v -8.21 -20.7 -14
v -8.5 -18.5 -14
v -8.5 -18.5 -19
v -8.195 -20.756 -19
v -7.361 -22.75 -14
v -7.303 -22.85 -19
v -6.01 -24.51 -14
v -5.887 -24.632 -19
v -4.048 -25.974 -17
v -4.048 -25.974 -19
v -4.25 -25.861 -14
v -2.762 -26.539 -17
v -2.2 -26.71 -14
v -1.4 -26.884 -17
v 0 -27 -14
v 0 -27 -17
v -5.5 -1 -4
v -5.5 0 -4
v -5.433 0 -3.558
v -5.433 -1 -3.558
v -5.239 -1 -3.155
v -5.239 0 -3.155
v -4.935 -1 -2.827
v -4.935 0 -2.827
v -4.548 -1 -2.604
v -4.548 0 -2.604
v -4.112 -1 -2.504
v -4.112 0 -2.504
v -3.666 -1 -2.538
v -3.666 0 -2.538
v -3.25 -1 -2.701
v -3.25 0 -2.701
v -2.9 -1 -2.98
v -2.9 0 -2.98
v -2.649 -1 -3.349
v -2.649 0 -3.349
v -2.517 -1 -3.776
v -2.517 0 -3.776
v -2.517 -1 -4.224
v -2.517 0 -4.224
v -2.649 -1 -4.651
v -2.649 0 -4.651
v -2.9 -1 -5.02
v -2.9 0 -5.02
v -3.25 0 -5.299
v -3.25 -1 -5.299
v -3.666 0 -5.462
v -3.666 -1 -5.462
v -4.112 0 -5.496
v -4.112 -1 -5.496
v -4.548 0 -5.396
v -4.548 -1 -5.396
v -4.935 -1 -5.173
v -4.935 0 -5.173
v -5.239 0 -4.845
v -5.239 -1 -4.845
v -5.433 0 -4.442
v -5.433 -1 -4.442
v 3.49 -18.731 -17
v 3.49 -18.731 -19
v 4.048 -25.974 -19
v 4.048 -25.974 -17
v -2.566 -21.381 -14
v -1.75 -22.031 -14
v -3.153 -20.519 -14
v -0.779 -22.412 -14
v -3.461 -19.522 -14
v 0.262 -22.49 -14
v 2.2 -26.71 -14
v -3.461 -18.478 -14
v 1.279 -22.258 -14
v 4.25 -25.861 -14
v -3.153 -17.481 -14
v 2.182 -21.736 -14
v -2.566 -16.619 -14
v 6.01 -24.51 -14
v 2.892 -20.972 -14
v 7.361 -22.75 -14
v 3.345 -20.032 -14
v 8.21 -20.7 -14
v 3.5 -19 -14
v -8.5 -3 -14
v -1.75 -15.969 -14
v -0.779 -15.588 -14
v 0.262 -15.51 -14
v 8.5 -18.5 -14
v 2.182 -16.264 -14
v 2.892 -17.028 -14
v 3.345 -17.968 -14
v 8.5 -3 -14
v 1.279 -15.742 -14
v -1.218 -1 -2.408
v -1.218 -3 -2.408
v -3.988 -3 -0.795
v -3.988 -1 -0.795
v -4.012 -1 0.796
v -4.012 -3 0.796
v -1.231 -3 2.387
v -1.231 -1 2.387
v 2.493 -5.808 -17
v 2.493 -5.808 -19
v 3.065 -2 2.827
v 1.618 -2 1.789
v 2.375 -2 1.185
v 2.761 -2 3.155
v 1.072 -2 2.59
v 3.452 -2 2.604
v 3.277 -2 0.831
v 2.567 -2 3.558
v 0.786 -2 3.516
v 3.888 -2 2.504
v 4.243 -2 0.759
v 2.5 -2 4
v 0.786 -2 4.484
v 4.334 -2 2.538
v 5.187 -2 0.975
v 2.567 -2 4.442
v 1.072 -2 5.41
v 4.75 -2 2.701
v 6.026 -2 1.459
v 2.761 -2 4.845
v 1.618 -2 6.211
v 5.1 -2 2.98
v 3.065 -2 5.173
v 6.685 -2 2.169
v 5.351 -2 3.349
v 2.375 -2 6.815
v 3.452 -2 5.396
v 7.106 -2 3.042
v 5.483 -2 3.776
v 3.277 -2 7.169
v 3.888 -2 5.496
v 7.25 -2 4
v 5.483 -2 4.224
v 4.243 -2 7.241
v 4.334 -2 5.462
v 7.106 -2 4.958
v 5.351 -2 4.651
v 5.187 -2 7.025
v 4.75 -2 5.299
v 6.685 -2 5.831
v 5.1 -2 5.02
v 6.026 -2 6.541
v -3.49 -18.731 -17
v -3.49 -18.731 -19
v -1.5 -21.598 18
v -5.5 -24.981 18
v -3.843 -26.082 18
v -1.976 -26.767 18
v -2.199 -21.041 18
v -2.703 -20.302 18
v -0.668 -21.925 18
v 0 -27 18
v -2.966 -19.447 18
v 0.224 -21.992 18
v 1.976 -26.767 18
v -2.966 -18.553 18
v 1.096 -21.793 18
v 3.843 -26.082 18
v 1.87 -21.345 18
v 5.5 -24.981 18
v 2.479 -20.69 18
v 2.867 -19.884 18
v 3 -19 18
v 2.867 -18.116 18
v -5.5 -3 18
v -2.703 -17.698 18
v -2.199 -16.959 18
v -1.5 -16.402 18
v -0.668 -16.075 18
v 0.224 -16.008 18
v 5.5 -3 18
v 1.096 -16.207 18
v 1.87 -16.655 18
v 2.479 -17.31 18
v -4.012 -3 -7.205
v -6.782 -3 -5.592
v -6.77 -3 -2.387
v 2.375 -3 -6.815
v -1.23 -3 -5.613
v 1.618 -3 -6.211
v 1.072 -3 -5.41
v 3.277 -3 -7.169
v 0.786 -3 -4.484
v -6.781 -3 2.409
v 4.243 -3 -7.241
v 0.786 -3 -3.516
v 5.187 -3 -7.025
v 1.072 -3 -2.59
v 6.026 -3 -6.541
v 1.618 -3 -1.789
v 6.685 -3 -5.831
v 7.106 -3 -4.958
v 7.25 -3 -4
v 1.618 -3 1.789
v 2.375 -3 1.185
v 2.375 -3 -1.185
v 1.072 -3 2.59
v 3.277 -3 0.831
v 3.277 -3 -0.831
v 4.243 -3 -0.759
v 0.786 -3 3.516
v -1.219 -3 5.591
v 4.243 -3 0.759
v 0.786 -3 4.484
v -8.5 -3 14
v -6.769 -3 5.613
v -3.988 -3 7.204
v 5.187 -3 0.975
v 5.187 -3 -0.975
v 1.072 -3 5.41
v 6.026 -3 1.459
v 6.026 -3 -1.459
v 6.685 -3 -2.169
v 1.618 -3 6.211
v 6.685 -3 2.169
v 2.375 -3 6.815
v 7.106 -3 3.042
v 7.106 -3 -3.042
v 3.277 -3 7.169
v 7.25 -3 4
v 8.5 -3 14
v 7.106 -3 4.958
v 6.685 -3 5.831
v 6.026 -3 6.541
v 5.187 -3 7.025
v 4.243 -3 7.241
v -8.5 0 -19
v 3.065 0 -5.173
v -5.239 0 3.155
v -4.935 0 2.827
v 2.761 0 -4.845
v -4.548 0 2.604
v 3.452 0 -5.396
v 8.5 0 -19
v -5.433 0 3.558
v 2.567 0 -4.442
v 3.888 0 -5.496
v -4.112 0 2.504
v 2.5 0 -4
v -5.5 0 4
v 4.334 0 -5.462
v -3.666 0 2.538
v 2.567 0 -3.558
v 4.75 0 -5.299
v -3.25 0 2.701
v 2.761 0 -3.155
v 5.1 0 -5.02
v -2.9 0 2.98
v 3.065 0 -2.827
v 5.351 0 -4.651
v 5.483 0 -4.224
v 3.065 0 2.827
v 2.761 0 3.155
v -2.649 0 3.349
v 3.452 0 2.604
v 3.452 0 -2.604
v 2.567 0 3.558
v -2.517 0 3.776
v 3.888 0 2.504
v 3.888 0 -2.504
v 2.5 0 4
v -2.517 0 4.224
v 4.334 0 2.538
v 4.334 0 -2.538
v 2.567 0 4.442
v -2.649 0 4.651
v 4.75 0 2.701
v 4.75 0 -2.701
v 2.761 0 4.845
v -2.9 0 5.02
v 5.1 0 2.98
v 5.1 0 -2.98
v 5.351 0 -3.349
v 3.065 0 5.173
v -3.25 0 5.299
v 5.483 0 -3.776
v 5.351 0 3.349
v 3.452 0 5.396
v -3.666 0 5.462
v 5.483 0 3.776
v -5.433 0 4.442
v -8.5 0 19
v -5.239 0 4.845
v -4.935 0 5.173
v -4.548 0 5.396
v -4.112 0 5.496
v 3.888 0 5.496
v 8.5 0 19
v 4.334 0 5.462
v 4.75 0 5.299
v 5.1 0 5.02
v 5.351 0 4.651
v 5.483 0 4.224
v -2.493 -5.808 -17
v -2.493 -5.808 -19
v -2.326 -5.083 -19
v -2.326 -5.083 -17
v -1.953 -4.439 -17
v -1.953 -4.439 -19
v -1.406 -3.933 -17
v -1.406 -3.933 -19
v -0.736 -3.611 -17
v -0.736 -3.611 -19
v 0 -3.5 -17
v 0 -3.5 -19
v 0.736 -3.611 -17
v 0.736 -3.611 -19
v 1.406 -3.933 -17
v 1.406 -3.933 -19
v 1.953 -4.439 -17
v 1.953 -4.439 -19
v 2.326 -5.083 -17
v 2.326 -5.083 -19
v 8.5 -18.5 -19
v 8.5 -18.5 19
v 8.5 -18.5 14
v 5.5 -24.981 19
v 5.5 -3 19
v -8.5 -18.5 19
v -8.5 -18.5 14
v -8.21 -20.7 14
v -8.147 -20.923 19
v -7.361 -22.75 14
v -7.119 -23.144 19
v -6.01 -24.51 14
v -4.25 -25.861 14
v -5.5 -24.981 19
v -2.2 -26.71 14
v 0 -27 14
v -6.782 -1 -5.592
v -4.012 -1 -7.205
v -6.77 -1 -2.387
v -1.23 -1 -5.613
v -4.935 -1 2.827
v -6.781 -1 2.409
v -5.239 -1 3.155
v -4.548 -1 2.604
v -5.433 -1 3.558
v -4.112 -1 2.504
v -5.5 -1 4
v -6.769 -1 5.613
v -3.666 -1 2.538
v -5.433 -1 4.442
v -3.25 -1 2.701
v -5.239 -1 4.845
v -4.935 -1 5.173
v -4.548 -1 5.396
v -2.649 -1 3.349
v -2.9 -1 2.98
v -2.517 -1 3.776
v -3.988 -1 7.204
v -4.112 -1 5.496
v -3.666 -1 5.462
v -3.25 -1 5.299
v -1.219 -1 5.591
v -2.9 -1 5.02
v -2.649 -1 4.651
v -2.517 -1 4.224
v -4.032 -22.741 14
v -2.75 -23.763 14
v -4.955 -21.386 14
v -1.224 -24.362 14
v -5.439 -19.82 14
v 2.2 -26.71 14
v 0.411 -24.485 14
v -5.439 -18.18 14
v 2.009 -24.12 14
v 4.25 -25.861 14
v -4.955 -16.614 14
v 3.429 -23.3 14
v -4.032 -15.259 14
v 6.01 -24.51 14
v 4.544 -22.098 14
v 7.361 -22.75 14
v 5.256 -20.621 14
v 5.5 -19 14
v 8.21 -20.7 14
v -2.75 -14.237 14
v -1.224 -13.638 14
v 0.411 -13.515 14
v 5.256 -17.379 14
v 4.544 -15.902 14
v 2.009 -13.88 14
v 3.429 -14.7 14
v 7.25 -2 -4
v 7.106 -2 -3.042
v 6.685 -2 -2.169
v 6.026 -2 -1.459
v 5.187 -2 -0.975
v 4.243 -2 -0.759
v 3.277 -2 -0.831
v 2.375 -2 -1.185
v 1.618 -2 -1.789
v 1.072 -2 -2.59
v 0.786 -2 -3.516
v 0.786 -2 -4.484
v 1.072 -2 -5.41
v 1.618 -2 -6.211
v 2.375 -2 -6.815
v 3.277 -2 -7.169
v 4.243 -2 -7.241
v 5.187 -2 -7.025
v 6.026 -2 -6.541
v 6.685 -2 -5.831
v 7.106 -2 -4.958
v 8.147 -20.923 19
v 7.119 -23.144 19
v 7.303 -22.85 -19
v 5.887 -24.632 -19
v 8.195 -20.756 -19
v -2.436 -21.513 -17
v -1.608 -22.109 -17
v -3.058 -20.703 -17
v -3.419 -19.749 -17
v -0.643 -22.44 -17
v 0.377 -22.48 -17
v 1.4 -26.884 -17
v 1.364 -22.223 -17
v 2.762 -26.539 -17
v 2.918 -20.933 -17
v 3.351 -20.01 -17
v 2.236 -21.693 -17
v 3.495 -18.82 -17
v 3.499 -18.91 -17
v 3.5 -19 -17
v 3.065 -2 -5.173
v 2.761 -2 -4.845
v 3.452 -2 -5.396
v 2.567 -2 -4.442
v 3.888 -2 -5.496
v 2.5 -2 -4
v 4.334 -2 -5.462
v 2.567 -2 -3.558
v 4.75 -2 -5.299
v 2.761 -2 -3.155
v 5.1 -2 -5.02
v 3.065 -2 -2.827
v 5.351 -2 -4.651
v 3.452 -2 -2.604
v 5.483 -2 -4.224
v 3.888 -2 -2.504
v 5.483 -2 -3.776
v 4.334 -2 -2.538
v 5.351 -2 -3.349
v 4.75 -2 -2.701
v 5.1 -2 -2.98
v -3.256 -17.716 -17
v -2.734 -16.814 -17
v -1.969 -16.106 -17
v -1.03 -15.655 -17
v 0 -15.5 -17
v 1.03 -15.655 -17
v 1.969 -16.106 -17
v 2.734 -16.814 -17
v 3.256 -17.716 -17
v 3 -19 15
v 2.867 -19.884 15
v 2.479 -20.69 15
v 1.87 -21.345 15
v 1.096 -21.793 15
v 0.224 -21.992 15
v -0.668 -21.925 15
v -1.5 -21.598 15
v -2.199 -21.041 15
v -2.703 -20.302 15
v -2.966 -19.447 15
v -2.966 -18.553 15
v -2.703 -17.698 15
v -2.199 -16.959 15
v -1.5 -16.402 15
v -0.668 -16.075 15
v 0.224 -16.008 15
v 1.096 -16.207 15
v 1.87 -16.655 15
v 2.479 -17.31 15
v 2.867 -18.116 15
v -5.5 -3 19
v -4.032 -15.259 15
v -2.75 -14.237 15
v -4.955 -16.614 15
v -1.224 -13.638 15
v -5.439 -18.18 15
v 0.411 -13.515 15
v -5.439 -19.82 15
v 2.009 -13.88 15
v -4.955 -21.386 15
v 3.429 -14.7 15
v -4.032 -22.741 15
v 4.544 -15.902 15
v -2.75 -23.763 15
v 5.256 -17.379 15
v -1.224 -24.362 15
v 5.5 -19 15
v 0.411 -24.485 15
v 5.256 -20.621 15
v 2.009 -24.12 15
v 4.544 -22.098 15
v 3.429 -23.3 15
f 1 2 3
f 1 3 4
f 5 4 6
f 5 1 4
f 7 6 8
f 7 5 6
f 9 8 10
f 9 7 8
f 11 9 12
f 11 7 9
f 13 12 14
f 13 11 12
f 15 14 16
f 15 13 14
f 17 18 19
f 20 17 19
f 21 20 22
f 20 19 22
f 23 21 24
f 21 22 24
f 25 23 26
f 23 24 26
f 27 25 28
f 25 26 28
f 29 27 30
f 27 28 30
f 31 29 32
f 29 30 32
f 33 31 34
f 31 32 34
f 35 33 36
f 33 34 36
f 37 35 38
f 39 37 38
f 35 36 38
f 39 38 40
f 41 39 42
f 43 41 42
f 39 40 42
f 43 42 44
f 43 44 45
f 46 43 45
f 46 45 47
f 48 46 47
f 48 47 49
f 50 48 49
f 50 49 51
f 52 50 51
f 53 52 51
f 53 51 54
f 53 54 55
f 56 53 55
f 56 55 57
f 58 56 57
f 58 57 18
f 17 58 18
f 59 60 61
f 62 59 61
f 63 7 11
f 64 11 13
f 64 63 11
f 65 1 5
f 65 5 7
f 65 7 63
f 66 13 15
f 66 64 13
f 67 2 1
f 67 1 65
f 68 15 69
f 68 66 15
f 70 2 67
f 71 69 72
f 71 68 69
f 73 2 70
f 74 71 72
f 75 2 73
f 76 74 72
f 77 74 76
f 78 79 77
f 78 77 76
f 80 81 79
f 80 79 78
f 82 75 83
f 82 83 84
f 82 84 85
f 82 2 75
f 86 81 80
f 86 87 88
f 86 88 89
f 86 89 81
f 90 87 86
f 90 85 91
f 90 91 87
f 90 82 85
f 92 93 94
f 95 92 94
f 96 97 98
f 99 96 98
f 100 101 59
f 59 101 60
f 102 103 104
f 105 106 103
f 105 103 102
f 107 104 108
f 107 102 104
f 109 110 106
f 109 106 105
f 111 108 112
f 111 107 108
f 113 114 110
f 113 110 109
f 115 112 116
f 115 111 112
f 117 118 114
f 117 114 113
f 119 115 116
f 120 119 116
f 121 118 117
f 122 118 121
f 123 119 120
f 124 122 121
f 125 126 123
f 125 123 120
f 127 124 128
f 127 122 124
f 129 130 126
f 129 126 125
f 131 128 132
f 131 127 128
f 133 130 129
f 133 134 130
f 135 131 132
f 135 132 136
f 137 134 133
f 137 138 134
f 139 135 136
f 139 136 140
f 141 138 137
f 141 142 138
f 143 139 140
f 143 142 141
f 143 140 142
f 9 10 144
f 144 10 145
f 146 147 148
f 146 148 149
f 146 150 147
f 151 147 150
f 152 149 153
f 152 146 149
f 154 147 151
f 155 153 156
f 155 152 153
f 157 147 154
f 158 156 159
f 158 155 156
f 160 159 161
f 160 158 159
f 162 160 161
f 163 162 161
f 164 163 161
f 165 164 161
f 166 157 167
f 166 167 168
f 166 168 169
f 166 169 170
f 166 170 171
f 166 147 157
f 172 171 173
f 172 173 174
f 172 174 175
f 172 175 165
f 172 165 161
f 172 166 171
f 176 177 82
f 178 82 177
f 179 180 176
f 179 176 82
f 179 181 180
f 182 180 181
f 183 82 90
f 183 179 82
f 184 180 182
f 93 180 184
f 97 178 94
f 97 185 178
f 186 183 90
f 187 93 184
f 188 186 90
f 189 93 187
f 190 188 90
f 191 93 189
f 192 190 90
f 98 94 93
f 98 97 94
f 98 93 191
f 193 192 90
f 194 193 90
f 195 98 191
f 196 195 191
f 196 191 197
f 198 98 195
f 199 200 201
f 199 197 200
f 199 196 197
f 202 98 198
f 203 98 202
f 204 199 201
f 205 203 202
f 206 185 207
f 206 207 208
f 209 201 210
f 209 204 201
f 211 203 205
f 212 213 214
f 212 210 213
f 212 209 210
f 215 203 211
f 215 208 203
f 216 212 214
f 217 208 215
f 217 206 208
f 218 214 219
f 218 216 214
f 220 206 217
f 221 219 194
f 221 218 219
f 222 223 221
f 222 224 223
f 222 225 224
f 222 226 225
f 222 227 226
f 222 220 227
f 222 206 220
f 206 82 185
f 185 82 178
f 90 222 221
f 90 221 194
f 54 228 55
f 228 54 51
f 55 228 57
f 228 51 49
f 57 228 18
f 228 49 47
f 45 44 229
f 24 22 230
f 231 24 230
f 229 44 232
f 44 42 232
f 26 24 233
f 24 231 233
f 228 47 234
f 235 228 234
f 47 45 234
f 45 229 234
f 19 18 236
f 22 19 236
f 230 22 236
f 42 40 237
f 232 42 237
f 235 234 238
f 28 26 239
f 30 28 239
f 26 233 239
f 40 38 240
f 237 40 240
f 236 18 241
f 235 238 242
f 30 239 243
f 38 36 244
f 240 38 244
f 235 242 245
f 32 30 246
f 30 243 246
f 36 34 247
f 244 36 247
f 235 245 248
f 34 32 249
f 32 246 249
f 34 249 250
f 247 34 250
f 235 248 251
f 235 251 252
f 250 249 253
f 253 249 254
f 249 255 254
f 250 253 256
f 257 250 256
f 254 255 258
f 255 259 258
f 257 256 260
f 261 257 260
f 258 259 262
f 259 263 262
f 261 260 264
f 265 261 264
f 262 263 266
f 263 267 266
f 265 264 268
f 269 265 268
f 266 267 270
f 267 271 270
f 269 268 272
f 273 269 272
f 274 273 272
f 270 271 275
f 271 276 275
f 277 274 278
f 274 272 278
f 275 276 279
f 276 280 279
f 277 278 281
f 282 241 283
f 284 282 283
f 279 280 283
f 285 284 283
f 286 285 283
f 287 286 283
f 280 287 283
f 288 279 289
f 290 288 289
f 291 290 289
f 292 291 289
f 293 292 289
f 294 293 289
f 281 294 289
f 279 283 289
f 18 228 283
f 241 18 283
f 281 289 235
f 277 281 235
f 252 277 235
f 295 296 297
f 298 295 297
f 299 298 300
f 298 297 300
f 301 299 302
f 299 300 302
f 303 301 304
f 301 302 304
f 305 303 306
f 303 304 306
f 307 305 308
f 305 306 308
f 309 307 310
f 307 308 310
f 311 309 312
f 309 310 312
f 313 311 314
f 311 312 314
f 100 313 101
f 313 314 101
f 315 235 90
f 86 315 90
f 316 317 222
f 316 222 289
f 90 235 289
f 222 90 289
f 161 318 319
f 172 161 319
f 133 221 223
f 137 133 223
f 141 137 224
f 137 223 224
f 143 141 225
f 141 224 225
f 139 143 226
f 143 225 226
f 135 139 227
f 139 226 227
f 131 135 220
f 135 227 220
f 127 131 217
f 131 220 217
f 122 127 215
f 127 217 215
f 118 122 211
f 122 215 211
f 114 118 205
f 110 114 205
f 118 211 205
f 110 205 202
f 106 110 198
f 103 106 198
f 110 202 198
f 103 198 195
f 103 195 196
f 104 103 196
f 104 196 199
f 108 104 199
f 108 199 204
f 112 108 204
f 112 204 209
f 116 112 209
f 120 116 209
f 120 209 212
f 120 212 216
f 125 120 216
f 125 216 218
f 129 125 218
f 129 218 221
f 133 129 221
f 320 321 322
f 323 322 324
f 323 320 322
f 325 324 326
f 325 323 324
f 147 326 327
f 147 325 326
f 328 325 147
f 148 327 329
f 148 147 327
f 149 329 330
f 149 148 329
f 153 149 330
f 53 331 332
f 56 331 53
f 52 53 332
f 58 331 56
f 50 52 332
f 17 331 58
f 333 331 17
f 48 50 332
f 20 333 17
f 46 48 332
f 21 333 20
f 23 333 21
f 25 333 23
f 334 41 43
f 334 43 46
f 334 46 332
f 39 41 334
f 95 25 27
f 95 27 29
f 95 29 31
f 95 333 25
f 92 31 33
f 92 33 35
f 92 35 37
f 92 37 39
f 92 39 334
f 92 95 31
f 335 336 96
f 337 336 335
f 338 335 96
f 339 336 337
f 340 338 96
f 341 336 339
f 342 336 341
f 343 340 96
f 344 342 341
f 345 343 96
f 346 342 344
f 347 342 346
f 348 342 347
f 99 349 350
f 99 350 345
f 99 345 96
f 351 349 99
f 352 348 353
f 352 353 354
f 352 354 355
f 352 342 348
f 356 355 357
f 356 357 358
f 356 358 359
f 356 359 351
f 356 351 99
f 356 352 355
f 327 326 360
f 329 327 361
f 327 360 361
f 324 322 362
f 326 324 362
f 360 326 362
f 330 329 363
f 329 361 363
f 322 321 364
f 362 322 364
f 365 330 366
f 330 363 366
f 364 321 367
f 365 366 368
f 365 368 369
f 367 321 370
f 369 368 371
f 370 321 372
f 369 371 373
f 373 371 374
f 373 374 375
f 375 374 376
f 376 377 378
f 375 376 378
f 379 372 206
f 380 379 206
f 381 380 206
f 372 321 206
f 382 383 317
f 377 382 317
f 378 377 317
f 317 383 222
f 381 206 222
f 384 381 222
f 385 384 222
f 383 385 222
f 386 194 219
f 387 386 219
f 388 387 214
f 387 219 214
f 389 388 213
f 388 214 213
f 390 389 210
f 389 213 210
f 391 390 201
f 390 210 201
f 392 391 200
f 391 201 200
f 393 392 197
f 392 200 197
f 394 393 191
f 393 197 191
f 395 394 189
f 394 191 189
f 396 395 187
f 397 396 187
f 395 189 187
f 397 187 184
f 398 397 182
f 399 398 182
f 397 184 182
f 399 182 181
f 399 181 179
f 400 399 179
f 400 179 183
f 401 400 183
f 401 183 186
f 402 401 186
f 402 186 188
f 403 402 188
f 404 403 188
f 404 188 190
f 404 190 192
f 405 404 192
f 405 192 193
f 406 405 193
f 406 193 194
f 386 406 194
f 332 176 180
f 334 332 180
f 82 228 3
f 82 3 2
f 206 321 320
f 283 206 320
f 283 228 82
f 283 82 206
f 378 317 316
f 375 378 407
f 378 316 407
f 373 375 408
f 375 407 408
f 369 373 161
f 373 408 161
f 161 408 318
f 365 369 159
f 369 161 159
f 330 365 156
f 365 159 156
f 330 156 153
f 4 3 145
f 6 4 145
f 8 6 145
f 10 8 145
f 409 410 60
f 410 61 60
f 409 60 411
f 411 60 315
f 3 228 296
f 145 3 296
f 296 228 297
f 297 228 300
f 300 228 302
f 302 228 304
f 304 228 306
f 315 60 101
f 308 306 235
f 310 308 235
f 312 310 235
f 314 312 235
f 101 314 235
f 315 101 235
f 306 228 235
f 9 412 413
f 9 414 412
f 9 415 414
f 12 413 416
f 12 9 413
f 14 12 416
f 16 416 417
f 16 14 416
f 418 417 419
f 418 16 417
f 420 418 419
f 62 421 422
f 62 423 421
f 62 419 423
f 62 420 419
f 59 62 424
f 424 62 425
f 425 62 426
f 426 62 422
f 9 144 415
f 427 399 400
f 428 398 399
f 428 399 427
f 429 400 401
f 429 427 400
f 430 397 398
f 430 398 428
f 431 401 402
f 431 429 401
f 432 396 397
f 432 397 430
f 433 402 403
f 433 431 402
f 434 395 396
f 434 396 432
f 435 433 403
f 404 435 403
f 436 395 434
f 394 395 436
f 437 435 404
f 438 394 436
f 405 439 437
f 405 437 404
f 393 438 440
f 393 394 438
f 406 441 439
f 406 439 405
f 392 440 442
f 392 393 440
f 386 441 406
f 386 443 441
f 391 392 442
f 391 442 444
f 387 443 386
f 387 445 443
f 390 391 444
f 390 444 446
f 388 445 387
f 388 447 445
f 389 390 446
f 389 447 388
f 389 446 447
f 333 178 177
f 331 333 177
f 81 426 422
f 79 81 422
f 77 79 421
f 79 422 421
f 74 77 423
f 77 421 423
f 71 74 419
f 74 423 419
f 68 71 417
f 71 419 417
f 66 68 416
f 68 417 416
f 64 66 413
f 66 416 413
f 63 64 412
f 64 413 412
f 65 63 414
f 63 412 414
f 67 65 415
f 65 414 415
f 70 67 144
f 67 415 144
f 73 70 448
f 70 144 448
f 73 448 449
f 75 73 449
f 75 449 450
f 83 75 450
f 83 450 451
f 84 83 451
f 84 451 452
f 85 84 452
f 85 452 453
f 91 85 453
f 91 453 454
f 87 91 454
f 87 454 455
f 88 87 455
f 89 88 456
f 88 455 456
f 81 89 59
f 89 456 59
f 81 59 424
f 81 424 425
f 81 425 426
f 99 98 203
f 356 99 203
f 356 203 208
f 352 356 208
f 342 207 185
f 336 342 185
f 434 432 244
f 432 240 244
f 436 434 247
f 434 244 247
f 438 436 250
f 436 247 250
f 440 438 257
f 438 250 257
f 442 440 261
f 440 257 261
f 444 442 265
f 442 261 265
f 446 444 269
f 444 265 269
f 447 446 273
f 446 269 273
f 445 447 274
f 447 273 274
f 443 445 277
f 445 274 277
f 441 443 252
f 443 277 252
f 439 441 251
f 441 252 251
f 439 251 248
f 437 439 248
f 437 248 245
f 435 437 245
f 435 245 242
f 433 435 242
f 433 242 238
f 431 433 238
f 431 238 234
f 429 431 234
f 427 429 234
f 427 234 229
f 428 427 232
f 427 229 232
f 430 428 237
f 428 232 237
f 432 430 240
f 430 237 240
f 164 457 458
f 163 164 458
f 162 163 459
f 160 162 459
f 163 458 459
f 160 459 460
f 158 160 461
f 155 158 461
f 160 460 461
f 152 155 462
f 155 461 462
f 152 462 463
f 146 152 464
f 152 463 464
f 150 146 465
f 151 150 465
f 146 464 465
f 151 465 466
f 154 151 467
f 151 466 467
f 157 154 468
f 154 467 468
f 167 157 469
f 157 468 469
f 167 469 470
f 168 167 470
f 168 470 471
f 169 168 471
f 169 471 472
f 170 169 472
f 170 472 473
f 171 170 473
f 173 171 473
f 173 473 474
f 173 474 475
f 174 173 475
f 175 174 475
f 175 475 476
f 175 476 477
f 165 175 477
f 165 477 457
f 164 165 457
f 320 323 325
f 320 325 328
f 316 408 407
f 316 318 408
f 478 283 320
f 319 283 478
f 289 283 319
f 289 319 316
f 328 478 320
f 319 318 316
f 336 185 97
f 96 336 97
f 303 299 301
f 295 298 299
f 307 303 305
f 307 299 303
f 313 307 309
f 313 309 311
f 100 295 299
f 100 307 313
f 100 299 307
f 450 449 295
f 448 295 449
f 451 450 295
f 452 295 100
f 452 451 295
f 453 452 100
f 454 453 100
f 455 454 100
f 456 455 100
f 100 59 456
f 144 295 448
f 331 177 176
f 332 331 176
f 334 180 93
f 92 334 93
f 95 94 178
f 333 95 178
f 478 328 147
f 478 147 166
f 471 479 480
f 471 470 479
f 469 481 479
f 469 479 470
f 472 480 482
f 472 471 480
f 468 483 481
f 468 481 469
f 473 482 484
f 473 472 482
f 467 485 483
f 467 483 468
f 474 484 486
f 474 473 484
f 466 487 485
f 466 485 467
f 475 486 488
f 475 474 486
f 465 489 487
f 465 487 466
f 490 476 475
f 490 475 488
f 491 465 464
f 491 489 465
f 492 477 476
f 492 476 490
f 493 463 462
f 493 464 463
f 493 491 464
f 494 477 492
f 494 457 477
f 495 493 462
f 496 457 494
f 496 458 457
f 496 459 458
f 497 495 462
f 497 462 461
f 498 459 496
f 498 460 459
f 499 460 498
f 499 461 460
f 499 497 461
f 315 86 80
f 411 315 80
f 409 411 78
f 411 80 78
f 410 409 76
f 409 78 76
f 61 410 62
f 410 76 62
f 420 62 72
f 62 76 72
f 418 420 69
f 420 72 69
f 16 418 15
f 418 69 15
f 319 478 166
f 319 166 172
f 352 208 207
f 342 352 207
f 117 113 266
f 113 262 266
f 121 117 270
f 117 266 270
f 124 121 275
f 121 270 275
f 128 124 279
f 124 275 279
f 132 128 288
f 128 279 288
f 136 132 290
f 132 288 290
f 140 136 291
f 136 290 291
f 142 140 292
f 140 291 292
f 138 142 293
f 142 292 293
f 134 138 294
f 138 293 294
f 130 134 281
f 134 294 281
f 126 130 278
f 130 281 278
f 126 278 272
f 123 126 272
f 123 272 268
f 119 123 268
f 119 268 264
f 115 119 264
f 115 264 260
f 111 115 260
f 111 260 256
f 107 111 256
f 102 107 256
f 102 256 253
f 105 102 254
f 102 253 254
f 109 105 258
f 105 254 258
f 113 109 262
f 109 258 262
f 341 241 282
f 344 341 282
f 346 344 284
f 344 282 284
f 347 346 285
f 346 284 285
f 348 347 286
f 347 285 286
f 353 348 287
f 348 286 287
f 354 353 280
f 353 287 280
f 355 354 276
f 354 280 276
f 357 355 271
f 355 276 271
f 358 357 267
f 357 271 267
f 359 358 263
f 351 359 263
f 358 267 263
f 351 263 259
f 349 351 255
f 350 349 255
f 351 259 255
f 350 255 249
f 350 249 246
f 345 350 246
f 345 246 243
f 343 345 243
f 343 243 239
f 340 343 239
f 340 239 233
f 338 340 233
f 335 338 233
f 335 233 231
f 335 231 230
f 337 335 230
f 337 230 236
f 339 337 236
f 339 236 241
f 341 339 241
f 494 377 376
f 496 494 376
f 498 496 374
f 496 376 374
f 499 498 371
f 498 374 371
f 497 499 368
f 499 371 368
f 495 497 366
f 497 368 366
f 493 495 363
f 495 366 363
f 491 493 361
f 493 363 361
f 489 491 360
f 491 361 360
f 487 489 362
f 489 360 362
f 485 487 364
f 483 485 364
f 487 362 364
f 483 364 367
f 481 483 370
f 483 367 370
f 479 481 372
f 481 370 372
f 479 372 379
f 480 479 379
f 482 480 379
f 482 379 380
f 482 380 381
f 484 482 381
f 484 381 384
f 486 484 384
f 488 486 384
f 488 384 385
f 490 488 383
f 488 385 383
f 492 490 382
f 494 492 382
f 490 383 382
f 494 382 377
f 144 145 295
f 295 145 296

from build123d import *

# Parameters (mm, degrees)
F0_W            = 17
F0_H            = 38
F1_DEPTH        = 3
F2_W            = 17
F2_H            = 5
F3_DEPTH        = 24
F4_R            = 8.49999
F5_R            = 3
F6_DEPTH        = 40
F7_W            = 11
F7_H            = 29.9753743202
F8_DEPTH        = 1
F10_DEPTH       = 2
F11_R           = 5.5
F12_DEPTH       = 1
F14_D           = 1
F14_DEPTH       = 20
F14_TIP         = 0.3004303095
F16_D           = 3
F16_DEPTH       = 20
F16_CBORE_D     = 6.5
F16_CBORE_DEPTH = 1
F16_TIP         = 0.9012909285
F18_R           = 3.5
F19_DEPTH       = 25
F21_DEPTH       = 2
F22_D           = 3


# Not quite as in the source:
# - a fillet or chamfer is up to 0.001 mm smaller than in the source, because OpenCascade refuses the exact size
# - a feature names something its author has since deleted; it is built from what else it names


with BuildPart() as f1:
    # F0 (on Front) → F1 (new body)
    with BuildSketch(Plane.XZ):
        Rectangle(F0_W, F0_H)
    extrude(amount=F1_DEPTH)

    # F2 (on face) → F3 (join)
    with BuildSketch(Plane.XZ.offset(3)):
        with Locations((0, -16.5)):
            Rectangle(F2_W, F2_H)
        with Locations((0, 16.5)):
            Rectangle(F2_W, F2_H)
    extrude(amount=F3_DEPTH)

    # F4 (radius 8.5 in the source; OpenCascade refuses exactly that, so slightly less here)
    f4_edges = [f1.edges().sort_by_distance(p)[0] for p in [
        (8.5, -27, -16.5),
        (-8.5, -27, -16.5),
        (8.5, -27, 16.5),
        (-8.5, -27, 16.5),
    ]]
    fillet(f4_edges, radius=F4_R)

    # F5 (on face) → F6 (cut)
    with BuildSketch(Plane(origin=(0, 0, -19), x_dir=(1, 0, 0), z_dir=(0, 0, -1))):
        with Locations((0, 19)):
            Circle(F5_R)
    extrude(amount=-F6_DEPTH, mode=Mode.SUBTRACT)

    # F7 (on face) → F8 (cut)
    with BuildSketch(Plane.XY.offset(19)):
        with Locations((0, -17.9876871601)):
            Rectangle(F7_W, F7_H)
    extrude(amount=-F8_DEPTH, mode=Mode.SUBTRACT)

    # F9 (on face) → F10 (cut)
    with BuildSketch(Plane(origin=(0, 0, -19), x_dir=(1, 0, 0), z_dir=(0, 0, -1))):
        with BuildLine():
            Line((4.2340652424, 28.3797578726), (-4.2340652424, 28.3797578726))
            Line((-4.2340652424, 28.3797578726), (-3.4896296074, 18.730769238))
            ThreePointArc((-3.4896296074, 18.730769238), (-0.1347152072, 22.4974064409), (3.5, 19))
            ThreePointArc((3.5, 19), (3.4974064409, 18.8652847928), (3.4896296074, 18.730769238))
            Line((3.4896296074, 18.730769238), (4.2340652424, 28.3797578726))
        make_face()
        with BuildLine():
            ThreePointArc((3.4896296074, 18.730769238), (0, 15.5), (-3.4896296074, 18.730769238))
            Line((-3.4896296074, 18.730769238), (-2.4925925763, 5.8076923077))
            ThreePointArc((-2.4925925763, 5.8076923077), (0, 3.5), (2.4925925763, 5.8076923077))
            Line((2.4925925763, 5.8076923077), (3.4896296074, 18.730769238))
        make_face()
        with BuildLine():
            ThreePointArc((3.5, 19), (-0.1347152072, 22.4974064409), (-3.4896296074, 18.730769238))
            ThreePointArc((-3.4896296074, 18.730769238), (0, 15.5), (3.4896296074, 18.730769238))
            ThreePointArc((3.4896296074, 18.730769238), (3.4974064409, 18.8652847928), (3.5, 19))
        make_face()
    extrude(amount=-F10_DEPTH, mode=Mode.SUBTRACT)

    # F11 (on face) → F12 (cut)
    with BuildSketch(Plane(origin=(0, 0, 14), x_dir=(1, 0, 0), z_dir=(0, 0, -1))):
        with Locations((0, 19)):
            Circle(F11_R)
    extrude(amount=-F12_DEPTH, mode=Mode.SUBTRACT)

    # F14
    with Locations(Plane(origin=(0, 0, 0), x_dir=(-1, 0, 0), z_dir=(0, 1, 0))):
        with Locations((-4, 4), (-4, -4)):
            Hole(F14_D / 2, depth=F14_DEPTH)
            with Locations((0, 0, -(F14_DEPTH + F14_TIP / 2))):  # 118° drill point
                Cone(0, F14_D / 2, F14_TIP, mode=Mode.SUBTRACT)

    # F16
    with Locations(Plane.XZ.offset(3)):
        with Locations((4, 4), (4, -4)):
            CounterBoreHole(F16_D / 2, F16_CBORE_D / 2, F16_CBORE_DEPTH, depth=F16_DEPTH)
            with Locations((0, 0, -(F16_DEPTH + F16_TIP / 2))):  # 118° drill point
                Cone(0, F16_D / 2, F16_TIP, mode=Mode.SUBTRACT)

    # F18 (on face) → F19 (cut)
    with BuildSketch(Plane(origin=(0, 0, -17), x_dir=(1, 0, 0), z_dir=(0, 0, -1))):
        with Locations((0, 19)):
            Circle(F18_R)
    extrude(amount=-F19_DEPTH, mode=Mode.SUBTRACT)

    # F20 (on face) → F21 (cut)
    with BuildSketch(Plane.XZ.offset(3)):
        Polygon((-1.2190877389, 5.5914901538), (-3.9878147725, 7.2040857407), (-6.7687270336, 5.6125955869), (-6.7809122611, 2.4085098462), (-4.0121852275, 0.7959142593), (-1.2312729664, 2.3874044131), align=None)
        Polygon((-1.2179301405, -2.4078473634), (-3.9878097002, -0.7945805083), (-6.7698795597, -2.3867331448), (-6.7820698595, -5.5921526366), (-4.0121902998, -7.2054194917), (-1.2301204403, -5.6132668552), align=None)
    extrude(amount=-F21_DEPTH, mode=Mode.SUBTRACT)

    # F22 (through all)
    with Locations(Plane.XZ.offset(3)):
        with Locations((-4, 4), (-4, -4)):
            Hole(F22_D / 2)


solid = f1.part
